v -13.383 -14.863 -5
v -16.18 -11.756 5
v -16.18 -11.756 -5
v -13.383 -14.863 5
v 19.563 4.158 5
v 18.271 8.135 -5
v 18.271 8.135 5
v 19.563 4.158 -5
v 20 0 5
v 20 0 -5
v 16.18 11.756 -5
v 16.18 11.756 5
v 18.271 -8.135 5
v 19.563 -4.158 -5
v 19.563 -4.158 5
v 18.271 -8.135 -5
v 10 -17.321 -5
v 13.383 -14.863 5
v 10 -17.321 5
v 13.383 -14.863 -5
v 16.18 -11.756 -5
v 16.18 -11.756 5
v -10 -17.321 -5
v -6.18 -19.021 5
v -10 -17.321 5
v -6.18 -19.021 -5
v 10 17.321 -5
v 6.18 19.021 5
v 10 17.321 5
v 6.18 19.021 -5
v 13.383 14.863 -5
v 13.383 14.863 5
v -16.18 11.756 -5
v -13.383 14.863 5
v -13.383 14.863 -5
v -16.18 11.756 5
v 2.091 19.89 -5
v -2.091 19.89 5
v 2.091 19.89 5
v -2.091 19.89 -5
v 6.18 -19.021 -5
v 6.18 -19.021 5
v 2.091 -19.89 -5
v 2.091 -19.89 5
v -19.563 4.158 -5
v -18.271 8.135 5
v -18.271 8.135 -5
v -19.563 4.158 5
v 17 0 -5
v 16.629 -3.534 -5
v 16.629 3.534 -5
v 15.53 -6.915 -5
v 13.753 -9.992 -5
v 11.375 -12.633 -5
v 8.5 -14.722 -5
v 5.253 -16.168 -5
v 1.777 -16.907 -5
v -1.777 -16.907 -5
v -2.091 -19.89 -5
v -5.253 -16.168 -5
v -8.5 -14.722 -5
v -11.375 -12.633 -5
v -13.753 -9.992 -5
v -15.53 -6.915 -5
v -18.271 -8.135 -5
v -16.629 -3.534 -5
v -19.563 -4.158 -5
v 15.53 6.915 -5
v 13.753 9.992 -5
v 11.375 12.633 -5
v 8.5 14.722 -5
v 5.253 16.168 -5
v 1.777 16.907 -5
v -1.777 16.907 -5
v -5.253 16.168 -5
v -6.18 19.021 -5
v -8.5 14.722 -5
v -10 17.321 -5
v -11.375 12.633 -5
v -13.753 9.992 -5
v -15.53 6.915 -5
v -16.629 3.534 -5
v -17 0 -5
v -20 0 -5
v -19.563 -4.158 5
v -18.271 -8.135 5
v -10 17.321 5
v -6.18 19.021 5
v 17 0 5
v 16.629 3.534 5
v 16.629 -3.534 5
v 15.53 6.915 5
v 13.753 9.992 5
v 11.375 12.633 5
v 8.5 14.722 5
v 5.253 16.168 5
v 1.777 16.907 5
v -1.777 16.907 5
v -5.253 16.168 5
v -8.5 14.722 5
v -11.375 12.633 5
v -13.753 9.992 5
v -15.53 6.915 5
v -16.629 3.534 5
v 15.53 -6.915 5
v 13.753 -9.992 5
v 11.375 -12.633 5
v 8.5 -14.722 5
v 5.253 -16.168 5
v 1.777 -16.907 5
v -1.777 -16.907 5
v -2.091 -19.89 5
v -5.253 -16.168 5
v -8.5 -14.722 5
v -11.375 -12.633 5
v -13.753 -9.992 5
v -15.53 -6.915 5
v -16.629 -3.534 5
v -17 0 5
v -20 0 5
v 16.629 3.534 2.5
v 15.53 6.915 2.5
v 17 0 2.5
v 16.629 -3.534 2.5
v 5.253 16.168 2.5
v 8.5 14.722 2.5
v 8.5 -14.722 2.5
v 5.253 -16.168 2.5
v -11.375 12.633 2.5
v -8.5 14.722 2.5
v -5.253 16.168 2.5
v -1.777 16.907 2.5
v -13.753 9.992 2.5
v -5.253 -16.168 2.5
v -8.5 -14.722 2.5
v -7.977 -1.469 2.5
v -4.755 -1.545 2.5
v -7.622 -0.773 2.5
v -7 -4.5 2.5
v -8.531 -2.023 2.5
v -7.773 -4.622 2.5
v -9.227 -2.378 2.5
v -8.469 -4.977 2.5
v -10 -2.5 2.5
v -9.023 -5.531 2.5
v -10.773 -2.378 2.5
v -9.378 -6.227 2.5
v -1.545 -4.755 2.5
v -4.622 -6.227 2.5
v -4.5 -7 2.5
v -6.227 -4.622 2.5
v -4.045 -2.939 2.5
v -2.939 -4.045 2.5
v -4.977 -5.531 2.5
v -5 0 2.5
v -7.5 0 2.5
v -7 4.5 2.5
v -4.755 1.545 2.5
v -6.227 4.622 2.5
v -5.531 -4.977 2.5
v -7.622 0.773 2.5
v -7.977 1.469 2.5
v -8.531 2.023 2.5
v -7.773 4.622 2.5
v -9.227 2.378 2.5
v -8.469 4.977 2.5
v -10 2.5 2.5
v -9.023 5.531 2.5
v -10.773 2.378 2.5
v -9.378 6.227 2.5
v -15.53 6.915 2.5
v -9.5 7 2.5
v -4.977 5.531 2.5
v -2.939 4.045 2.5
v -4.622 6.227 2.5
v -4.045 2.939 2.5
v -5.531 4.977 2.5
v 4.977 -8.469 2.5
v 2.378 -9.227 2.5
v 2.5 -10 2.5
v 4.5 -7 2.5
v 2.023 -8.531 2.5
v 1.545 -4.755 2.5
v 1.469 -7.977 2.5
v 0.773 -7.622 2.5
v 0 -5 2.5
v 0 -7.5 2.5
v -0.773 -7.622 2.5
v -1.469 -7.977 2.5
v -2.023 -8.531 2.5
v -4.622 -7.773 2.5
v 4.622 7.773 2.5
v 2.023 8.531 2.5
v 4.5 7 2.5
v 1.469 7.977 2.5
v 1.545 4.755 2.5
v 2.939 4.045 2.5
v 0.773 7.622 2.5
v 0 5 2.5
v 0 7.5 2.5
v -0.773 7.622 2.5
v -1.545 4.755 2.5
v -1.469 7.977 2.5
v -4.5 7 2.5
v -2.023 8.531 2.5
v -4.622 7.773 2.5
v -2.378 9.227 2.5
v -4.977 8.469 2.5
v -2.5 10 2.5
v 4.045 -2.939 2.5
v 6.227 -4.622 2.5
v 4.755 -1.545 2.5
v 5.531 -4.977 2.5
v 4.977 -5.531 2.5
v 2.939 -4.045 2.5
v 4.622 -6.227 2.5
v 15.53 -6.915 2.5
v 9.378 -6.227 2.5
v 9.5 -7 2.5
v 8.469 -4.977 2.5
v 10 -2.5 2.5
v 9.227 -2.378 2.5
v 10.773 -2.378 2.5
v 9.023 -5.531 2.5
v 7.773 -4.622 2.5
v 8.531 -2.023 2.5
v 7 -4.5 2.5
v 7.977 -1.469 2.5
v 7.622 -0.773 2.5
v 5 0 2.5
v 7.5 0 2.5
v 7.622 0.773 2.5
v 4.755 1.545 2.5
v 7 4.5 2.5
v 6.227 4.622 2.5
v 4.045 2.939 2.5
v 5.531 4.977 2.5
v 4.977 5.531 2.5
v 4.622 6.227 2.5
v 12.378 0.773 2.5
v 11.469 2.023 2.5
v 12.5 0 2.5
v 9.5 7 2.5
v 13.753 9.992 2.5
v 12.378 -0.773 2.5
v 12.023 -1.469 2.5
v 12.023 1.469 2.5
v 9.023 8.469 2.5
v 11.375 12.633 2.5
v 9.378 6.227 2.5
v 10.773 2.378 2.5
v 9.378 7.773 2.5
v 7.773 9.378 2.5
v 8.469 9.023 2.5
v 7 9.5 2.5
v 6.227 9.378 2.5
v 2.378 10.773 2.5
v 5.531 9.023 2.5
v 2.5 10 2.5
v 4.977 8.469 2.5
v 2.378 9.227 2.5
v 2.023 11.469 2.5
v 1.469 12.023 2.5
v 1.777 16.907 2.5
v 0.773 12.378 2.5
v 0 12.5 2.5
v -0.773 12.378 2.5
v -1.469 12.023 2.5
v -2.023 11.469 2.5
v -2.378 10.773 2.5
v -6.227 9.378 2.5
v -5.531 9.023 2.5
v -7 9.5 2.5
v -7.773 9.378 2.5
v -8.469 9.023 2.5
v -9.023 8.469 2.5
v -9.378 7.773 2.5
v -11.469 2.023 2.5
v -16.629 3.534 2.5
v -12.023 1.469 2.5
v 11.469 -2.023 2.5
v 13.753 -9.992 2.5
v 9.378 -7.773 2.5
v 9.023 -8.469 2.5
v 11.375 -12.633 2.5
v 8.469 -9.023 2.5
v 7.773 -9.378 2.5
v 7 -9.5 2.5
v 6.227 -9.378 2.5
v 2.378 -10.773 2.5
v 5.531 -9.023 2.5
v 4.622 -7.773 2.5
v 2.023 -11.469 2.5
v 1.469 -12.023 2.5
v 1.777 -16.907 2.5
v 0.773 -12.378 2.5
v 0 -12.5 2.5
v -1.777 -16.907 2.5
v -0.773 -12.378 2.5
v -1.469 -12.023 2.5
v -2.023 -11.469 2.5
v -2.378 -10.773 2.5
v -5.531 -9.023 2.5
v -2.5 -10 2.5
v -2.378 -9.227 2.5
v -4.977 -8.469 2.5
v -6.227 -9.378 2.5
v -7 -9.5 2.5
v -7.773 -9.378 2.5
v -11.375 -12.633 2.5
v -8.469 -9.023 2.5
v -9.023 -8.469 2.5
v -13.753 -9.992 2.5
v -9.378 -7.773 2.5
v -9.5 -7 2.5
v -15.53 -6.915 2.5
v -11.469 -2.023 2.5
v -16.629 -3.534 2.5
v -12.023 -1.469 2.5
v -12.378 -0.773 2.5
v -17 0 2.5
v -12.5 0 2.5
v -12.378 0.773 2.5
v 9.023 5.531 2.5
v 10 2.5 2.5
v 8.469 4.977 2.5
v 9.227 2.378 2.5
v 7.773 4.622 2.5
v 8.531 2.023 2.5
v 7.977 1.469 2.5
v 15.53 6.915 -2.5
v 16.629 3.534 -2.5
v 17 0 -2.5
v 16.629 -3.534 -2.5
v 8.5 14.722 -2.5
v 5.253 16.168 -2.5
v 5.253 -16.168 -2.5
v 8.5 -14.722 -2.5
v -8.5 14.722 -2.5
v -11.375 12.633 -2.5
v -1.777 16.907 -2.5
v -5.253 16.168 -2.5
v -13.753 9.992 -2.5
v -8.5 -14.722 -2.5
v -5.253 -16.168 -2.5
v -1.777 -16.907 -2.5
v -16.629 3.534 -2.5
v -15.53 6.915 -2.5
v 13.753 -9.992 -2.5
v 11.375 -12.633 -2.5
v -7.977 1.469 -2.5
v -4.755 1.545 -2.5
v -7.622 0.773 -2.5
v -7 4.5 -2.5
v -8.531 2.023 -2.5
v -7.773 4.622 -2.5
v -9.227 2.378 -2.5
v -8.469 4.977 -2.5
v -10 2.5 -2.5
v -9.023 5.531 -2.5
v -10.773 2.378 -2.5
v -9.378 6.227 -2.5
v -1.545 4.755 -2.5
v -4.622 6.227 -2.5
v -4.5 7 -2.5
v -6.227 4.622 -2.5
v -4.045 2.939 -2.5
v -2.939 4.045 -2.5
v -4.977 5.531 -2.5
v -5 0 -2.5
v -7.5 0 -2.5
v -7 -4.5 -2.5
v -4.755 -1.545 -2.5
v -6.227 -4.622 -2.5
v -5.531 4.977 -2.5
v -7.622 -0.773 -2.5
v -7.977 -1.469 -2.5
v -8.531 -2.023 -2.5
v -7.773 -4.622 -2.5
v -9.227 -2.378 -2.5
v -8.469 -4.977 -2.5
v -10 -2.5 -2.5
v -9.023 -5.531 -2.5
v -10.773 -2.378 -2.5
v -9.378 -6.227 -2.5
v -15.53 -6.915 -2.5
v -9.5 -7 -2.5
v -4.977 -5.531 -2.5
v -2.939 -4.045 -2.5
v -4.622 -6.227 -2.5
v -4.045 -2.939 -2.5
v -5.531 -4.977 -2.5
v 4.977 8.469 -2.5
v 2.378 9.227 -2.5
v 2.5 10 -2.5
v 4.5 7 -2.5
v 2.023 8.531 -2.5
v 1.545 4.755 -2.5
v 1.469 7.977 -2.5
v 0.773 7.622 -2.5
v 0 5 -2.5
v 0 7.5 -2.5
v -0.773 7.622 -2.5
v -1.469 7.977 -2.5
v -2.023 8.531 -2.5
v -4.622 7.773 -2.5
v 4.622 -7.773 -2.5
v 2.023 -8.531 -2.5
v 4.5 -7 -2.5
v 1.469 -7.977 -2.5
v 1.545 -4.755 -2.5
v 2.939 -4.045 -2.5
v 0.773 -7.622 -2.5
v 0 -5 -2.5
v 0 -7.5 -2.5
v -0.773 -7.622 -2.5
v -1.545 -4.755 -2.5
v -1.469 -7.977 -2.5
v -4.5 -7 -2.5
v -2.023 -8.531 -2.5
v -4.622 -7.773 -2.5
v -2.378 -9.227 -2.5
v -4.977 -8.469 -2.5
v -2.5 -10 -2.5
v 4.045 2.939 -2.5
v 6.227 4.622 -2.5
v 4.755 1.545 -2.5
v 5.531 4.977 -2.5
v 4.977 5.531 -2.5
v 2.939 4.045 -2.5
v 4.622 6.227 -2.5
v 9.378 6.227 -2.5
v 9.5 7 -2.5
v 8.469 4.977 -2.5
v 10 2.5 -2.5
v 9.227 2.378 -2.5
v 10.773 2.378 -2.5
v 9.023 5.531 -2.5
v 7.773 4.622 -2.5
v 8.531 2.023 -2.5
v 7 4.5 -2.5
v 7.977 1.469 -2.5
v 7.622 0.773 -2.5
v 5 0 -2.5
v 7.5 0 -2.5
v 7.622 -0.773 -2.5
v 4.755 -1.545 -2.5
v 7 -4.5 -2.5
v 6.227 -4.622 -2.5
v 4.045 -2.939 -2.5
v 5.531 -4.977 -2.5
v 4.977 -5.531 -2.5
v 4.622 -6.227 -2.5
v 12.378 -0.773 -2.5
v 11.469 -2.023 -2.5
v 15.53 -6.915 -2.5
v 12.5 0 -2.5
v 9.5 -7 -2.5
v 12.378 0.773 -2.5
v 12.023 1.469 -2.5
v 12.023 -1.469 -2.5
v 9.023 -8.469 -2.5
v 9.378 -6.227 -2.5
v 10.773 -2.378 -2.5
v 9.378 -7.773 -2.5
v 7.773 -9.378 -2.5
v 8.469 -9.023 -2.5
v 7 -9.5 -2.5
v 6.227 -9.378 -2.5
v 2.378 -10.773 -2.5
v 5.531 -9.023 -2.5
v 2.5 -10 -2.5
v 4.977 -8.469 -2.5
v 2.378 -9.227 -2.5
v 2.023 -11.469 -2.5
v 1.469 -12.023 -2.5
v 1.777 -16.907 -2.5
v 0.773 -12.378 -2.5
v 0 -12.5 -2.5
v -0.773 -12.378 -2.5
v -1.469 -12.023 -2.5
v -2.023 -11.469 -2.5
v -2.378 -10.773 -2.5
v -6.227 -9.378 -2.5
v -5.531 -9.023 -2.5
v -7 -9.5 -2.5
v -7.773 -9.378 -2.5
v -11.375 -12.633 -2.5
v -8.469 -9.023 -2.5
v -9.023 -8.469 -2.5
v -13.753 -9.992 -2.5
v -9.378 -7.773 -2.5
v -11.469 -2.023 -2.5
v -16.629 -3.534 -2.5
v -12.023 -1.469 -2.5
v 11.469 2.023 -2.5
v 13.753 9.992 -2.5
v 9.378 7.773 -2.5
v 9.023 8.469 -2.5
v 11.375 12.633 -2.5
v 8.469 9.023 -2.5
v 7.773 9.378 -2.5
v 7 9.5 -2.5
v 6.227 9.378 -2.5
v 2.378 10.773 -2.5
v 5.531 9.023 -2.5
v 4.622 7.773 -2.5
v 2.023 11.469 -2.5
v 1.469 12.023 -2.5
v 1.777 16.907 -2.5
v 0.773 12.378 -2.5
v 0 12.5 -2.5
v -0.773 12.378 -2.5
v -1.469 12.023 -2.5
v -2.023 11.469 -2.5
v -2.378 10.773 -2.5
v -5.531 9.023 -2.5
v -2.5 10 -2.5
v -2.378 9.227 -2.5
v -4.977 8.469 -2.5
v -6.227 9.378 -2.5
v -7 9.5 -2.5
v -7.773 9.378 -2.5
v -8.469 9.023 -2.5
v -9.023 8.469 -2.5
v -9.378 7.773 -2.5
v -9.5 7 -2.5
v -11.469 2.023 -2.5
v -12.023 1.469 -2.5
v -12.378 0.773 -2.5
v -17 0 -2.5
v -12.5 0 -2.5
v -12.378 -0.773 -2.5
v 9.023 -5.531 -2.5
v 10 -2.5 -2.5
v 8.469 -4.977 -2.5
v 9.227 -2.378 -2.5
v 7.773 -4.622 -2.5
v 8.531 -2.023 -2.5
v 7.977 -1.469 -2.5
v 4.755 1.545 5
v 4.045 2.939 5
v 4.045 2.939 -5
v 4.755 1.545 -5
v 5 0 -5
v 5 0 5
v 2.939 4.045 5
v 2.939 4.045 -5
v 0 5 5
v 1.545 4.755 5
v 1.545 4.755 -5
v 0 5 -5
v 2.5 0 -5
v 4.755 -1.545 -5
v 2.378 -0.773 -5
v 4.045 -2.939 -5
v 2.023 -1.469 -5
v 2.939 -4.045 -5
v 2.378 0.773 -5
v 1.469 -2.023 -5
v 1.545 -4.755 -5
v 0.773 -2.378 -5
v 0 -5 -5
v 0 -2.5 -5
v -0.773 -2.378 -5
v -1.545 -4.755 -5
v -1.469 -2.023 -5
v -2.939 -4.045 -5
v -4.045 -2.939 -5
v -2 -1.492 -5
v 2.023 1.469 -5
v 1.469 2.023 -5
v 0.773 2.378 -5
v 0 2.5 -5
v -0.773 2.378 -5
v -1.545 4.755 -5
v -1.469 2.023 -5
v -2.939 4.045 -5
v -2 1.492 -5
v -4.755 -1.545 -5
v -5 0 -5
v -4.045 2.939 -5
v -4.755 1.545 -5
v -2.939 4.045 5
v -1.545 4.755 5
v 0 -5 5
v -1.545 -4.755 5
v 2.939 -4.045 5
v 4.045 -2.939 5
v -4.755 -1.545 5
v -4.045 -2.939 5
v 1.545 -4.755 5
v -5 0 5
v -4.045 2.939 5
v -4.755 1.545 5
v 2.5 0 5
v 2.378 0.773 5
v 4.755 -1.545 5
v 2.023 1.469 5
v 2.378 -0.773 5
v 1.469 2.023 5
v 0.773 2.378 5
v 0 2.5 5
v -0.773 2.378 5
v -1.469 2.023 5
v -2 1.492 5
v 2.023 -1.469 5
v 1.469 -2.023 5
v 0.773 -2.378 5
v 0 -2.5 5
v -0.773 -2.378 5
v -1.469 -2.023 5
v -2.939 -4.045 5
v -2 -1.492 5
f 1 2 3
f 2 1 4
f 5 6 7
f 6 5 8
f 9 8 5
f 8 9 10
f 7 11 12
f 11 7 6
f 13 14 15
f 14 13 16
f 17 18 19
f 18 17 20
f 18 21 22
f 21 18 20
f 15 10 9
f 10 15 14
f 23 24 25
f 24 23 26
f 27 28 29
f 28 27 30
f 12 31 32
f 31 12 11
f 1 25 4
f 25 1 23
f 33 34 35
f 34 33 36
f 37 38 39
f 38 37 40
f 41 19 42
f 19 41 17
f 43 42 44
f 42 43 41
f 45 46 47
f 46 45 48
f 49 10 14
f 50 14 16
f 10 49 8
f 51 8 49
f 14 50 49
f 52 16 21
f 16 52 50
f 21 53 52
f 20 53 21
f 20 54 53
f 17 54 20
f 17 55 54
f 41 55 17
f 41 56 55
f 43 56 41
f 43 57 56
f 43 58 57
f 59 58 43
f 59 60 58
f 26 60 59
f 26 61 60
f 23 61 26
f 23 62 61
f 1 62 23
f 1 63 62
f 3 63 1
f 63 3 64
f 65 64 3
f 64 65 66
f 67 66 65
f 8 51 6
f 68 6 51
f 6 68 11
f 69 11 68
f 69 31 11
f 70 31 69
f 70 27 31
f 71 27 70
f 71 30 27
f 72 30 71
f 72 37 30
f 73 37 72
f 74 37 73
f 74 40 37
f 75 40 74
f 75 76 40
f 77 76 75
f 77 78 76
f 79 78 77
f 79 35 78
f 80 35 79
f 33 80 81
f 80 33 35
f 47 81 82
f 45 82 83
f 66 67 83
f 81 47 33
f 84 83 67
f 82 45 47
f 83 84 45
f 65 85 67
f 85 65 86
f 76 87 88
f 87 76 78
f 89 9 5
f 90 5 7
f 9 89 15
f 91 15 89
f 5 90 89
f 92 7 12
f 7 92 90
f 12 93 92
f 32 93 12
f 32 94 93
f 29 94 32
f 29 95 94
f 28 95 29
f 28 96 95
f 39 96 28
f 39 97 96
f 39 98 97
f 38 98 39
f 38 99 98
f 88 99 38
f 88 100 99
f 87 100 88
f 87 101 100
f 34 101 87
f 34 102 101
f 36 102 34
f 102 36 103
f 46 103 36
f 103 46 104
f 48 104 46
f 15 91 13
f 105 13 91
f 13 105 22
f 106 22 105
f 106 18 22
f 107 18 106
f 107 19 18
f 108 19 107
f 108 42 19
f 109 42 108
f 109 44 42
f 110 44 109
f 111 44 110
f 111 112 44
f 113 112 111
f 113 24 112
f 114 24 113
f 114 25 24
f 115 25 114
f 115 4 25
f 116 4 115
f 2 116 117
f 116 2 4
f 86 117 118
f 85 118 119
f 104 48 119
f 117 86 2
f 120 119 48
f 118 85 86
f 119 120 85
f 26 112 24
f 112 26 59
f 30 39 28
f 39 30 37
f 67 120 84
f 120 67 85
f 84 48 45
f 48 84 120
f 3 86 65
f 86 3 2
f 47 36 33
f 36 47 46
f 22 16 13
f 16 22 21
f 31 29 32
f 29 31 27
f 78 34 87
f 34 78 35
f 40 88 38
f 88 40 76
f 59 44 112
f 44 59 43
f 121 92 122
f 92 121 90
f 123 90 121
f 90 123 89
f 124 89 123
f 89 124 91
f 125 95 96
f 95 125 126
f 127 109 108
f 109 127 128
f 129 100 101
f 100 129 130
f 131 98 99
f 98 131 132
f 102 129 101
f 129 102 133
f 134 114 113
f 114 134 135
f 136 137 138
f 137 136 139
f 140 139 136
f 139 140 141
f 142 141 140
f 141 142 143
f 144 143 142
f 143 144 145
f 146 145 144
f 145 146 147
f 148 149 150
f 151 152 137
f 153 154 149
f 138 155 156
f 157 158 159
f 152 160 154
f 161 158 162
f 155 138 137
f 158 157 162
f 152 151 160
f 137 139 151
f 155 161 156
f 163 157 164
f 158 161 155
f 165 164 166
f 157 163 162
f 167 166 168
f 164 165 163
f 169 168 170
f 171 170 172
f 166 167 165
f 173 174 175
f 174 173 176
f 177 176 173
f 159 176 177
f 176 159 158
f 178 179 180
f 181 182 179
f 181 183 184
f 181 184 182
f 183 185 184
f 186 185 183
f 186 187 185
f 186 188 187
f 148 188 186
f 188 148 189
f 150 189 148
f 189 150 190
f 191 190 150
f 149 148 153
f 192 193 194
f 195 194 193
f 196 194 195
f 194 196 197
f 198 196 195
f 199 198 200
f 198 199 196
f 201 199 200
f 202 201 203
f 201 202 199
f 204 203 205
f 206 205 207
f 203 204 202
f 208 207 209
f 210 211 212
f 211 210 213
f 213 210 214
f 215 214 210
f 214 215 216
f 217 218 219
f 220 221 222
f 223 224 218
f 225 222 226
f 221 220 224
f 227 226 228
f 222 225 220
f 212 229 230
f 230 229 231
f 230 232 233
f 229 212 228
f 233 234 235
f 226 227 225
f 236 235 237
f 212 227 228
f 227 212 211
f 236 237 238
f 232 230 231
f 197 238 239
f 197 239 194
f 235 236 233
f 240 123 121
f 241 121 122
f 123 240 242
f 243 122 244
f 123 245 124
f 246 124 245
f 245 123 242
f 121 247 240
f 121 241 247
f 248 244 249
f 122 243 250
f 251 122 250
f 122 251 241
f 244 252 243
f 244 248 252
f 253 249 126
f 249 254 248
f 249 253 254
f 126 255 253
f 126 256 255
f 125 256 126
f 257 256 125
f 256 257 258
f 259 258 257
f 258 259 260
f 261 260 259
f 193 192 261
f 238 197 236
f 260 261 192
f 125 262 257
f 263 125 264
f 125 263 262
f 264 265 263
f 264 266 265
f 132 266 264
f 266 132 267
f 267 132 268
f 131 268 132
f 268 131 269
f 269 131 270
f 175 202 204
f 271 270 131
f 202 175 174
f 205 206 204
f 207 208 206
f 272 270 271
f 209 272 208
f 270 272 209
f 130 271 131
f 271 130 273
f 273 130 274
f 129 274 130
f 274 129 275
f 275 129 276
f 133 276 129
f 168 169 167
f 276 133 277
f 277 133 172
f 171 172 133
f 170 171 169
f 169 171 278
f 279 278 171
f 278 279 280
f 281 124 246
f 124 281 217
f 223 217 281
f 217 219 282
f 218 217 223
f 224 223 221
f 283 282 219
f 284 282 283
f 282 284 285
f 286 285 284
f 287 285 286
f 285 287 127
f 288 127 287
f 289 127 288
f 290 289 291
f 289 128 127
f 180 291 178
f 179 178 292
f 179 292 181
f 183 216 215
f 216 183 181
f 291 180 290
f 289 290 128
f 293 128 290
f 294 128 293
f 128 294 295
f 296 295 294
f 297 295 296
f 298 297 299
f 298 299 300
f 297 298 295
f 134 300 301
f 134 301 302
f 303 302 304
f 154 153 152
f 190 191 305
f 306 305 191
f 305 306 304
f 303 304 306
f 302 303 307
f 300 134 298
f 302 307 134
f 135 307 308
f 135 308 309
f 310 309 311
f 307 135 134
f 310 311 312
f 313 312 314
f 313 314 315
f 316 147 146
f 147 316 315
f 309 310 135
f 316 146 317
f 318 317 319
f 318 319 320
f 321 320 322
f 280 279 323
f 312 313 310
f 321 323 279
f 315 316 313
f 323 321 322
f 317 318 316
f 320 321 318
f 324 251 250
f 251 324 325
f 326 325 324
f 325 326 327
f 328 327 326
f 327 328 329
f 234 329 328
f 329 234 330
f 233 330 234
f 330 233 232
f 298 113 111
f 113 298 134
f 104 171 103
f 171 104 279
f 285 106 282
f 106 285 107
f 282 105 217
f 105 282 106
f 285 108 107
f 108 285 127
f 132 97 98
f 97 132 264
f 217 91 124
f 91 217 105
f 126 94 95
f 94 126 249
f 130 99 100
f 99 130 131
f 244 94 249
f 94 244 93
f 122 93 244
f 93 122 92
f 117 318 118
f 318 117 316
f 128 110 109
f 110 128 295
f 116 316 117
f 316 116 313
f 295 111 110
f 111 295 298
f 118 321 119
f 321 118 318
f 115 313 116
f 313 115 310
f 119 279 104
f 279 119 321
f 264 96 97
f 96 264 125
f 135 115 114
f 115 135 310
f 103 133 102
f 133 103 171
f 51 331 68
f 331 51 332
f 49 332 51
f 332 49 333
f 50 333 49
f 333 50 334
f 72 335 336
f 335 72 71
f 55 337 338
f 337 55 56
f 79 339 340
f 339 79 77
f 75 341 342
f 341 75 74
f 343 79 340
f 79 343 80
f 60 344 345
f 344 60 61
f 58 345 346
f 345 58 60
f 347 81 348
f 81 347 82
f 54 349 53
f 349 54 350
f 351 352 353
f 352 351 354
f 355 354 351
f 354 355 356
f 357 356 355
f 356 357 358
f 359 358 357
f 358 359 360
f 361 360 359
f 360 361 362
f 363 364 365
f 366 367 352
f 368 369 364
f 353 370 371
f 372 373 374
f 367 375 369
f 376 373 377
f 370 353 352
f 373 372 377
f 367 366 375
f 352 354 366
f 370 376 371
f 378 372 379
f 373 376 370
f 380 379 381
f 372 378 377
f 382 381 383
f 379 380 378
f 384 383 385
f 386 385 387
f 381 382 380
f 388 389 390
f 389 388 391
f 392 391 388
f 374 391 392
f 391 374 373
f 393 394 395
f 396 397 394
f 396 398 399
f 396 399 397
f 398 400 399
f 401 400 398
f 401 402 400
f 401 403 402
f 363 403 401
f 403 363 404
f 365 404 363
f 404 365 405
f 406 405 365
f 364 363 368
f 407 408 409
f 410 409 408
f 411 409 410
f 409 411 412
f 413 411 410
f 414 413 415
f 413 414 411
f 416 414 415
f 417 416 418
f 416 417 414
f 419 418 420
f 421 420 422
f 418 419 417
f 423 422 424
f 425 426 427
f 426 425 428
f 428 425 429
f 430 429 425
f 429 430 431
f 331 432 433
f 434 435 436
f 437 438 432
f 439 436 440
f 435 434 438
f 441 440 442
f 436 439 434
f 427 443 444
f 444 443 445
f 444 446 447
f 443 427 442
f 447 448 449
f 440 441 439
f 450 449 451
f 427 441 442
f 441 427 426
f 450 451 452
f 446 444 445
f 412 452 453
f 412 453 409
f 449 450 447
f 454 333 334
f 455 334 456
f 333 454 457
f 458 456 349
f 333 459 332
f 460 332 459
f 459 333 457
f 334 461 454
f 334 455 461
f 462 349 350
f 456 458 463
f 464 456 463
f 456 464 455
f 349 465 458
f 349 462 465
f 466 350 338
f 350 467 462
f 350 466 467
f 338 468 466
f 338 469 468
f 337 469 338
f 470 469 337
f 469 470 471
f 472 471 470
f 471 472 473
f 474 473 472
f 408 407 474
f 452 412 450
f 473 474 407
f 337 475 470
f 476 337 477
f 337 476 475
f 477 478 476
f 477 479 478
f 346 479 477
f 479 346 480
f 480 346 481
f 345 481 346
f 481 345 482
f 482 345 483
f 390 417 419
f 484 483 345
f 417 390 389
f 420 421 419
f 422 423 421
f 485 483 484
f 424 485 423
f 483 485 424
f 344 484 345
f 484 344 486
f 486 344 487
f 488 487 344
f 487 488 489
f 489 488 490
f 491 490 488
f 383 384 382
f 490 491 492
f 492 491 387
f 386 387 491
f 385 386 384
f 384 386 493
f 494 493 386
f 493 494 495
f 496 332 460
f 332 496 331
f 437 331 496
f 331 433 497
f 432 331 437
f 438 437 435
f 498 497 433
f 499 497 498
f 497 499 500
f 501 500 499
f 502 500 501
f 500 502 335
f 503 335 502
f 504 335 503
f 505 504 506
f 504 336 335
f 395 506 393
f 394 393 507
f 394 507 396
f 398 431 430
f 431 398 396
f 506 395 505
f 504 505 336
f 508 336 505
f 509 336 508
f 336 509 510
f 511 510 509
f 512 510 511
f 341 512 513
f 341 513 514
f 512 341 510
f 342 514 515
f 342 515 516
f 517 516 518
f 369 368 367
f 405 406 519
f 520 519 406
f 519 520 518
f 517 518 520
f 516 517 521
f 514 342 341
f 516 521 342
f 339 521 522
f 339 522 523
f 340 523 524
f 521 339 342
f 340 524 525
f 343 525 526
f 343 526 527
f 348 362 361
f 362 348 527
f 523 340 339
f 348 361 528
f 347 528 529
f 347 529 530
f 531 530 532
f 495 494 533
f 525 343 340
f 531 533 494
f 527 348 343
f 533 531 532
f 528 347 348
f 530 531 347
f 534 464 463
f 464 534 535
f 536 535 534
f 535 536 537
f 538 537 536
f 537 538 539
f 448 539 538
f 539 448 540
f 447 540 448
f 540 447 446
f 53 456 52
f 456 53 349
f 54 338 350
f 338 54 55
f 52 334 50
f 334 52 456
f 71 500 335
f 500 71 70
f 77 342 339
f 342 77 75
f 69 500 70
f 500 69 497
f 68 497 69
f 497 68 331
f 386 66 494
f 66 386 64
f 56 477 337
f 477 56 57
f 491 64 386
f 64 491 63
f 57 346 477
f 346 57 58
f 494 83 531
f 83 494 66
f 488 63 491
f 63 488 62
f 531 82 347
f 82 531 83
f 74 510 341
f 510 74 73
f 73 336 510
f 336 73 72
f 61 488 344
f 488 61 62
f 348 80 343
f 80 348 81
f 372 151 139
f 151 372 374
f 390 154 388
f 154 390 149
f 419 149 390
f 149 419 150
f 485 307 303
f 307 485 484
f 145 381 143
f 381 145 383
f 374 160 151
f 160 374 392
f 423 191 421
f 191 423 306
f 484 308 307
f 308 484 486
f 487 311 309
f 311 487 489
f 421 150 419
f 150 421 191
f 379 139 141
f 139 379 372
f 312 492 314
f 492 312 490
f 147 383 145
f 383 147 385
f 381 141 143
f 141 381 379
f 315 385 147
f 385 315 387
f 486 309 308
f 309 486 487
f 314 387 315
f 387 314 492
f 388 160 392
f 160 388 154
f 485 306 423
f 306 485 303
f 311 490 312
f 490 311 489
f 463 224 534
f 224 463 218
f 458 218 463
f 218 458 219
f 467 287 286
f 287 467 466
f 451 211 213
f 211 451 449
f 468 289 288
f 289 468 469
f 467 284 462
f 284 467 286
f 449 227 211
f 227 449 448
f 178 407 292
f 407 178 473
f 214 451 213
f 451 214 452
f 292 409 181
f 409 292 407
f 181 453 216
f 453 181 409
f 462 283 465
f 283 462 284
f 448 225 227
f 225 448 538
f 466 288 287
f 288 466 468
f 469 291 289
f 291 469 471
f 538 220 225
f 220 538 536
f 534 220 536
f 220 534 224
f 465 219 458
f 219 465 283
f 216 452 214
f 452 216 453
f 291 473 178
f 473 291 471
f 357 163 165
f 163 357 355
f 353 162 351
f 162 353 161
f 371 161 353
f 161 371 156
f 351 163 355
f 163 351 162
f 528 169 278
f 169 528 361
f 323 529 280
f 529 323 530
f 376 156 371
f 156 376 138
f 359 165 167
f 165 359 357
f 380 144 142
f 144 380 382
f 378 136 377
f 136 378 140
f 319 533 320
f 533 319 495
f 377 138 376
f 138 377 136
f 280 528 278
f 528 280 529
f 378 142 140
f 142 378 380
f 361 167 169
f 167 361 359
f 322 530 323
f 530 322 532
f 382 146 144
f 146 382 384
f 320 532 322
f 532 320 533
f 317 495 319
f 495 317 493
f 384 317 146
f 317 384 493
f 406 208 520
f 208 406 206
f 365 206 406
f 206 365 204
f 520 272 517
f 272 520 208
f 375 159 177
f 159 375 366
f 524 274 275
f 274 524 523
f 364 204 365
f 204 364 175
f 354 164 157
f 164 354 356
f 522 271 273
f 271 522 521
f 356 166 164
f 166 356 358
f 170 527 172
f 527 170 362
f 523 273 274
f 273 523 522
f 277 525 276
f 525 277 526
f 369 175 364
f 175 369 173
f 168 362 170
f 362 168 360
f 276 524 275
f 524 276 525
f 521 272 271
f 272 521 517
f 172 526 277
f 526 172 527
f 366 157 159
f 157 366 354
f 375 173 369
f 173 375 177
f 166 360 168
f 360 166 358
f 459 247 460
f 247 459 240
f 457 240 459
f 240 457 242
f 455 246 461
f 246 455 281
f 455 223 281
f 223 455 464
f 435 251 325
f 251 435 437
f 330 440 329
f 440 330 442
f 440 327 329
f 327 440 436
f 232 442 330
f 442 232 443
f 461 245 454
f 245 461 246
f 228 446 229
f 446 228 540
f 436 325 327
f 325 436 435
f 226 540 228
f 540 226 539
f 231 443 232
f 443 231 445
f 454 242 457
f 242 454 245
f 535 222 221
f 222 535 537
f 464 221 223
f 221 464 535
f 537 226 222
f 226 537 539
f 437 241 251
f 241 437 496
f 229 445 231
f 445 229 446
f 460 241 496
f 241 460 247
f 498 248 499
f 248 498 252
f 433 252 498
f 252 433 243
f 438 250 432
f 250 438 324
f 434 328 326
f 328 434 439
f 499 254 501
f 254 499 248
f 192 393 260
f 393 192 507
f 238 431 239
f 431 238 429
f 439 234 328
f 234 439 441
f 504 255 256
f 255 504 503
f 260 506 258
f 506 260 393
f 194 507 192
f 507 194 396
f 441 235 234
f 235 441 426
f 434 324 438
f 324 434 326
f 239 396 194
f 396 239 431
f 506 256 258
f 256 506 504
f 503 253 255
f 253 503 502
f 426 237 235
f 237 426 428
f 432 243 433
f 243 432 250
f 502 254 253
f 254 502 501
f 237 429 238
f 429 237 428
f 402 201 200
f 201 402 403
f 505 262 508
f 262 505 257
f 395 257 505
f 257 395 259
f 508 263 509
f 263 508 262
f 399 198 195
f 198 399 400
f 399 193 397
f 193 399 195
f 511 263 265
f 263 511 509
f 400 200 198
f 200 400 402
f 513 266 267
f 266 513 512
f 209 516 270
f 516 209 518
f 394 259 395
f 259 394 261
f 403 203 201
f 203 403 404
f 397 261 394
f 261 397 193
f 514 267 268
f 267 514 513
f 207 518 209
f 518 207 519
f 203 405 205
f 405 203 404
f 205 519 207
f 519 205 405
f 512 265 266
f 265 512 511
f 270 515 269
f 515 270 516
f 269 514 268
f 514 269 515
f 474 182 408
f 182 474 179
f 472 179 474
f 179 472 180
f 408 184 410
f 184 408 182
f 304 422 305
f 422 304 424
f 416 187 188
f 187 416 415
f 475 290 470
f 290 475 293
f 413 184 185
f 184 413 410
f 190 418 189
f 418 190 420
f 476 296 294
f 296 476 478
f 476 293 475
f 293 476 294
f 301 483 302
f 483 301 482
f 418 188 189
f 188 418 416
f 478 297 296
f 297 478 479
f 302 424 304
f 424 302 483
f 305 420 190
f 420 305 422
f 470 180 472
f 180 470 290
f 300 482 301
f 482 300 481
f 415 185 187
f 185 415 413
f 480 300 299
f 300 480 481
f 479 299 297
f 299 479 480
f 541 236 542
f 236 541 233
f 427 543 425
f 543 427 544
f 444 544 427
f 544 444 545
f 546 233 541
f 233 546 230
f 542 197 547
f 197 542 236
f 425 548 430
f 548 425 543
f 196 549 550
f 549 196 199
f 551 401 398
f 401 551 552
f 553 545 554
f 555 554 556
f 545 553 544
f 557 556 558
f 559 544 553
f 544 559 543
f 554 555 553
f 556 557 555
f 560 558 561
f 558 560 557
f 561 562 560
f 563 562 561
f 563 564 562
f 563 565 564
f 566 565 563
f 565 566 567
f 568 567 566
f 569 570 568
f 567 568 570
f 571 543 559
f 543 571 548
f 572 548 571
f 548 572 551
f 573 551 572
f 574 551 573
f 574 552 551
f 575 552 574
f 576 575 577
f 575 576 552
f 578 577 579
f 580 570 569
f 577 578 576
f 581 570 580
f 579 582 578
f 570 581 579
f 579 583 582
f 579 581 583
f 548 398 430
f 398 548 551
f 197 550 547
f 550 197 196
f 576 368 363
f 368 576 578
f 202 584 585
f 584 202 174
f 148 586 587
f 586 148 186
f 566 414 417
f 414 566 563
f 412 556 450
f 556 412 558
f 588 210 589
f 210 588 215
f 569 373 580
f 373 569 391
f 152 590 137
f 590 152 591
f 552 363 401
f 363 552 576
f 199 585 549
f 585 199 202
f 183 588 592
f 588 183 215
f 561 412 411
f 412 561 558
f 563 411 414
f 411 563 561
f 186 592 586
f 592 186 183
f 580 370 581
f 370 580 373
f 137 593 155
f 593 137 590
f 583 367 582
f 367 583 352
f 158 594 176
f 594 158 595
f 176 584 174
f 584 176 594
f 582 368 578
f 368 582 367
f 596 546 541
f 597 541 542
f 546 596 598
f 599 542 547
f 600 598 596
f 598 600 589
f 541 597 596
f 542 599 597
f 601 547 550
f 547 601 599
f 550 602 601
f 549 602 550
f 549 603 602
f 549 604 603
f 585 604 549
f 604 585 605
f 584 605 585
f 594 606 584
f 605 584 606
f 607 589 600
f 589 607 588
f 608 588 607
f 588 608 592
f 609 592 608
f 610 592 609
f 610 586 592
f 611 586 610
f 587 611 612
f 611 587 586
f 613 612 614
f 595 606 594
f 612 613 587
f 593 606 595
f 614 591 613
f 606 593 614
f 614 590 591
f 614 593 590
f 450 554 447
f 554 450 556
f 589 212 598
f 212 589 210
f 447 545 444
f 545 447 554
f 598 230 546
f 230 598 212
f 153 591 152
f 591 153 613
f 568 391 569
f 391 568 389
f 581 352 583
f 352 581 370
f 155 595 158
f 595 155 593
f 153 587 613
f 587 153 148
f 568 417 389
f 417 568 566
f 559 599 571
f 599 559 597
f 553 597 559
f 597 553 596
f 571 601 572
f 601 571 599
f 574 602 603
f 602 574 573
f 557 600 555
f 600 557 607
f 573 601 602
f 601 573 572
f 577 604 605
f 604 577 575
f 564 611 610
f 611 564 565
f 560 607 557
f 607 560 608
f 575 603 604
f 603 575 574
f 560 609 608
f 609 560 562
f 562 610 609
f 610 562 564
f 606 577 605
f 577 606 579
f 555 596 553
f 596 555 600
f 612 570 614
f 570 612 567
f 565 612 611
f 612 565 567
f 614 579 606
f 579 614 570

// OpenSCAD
// Eduardo Blanco Bielsa - UO285176
module rueda(radioRueda,ancho,radioInterno, anchoInterno, radioPalier, anchoPalier, radioagujero, anchoagujero, offsetAgujero){ 
    difference(){
        union(){
            difference(){
                // rueda
                cylinder(h= ancho, r = radioRueda, center = true);
                translate([0, 0, 4])
                // rueda interna
                cylinder(h= anchoInterno, r = radioInterno, center = true);
                translate([0, 0, -4])
                // rueda interna
                cylinder(h= anchoInterno, r = radioInterno, center = true);
                
                //Agujeros de la rueda
                translate([-7,-7,-5])
                    cylinder(h = anchoagujero, r = radioagujero, $fn=offsetAgujero);
                translate([7,-7,-5])
                    cylinder(h = anchoagujero, r = radioagujero, $fn=offsetAgujero);
                translate([-10,0,-5])
                    cylinder(h = anchoagujero, r = radioagujero, $fn=offsetAgujero);
                translate([-7, 7, -5])
                    cylinder(h = anchoagujero, r = radioagujero, $fn=offsetAgujero);
                translate([10,0, -5])
                    cylinder(h = anchoagujero, r = radioagujero, $fn=offsetAgujero);
                translate([7, 7, -5])
                    cylinder(h = anchoagujero, r = radioagujero, $fn=offsetAgujero);
                translate([0, 10, -5])
                    cylinder(h = anchoagujero, r = radioagujero, $fn=offsetAgujero);
                translate([0, -10, -5])
                    cylinder(h = anchoagujero, r = radioagujero, $fn=offsetAgujero);           
            }
            //Palier
                cylinder(h= anchoPalier, r = radioPalier, center = true, $fn=offsetAgujero);
    }
            intersection() {
                //Agujero central
                translate([0, 0, -5])
                    cylinder(h = anchoagujero*2, r = radioagujero, $fn=offsetAgujero);  
                        translate([3,0,0])
                            cube(10, center = true);
}
            
}
}

rueda(20,10,17,3,5,10, 2.5, 10, 20);
